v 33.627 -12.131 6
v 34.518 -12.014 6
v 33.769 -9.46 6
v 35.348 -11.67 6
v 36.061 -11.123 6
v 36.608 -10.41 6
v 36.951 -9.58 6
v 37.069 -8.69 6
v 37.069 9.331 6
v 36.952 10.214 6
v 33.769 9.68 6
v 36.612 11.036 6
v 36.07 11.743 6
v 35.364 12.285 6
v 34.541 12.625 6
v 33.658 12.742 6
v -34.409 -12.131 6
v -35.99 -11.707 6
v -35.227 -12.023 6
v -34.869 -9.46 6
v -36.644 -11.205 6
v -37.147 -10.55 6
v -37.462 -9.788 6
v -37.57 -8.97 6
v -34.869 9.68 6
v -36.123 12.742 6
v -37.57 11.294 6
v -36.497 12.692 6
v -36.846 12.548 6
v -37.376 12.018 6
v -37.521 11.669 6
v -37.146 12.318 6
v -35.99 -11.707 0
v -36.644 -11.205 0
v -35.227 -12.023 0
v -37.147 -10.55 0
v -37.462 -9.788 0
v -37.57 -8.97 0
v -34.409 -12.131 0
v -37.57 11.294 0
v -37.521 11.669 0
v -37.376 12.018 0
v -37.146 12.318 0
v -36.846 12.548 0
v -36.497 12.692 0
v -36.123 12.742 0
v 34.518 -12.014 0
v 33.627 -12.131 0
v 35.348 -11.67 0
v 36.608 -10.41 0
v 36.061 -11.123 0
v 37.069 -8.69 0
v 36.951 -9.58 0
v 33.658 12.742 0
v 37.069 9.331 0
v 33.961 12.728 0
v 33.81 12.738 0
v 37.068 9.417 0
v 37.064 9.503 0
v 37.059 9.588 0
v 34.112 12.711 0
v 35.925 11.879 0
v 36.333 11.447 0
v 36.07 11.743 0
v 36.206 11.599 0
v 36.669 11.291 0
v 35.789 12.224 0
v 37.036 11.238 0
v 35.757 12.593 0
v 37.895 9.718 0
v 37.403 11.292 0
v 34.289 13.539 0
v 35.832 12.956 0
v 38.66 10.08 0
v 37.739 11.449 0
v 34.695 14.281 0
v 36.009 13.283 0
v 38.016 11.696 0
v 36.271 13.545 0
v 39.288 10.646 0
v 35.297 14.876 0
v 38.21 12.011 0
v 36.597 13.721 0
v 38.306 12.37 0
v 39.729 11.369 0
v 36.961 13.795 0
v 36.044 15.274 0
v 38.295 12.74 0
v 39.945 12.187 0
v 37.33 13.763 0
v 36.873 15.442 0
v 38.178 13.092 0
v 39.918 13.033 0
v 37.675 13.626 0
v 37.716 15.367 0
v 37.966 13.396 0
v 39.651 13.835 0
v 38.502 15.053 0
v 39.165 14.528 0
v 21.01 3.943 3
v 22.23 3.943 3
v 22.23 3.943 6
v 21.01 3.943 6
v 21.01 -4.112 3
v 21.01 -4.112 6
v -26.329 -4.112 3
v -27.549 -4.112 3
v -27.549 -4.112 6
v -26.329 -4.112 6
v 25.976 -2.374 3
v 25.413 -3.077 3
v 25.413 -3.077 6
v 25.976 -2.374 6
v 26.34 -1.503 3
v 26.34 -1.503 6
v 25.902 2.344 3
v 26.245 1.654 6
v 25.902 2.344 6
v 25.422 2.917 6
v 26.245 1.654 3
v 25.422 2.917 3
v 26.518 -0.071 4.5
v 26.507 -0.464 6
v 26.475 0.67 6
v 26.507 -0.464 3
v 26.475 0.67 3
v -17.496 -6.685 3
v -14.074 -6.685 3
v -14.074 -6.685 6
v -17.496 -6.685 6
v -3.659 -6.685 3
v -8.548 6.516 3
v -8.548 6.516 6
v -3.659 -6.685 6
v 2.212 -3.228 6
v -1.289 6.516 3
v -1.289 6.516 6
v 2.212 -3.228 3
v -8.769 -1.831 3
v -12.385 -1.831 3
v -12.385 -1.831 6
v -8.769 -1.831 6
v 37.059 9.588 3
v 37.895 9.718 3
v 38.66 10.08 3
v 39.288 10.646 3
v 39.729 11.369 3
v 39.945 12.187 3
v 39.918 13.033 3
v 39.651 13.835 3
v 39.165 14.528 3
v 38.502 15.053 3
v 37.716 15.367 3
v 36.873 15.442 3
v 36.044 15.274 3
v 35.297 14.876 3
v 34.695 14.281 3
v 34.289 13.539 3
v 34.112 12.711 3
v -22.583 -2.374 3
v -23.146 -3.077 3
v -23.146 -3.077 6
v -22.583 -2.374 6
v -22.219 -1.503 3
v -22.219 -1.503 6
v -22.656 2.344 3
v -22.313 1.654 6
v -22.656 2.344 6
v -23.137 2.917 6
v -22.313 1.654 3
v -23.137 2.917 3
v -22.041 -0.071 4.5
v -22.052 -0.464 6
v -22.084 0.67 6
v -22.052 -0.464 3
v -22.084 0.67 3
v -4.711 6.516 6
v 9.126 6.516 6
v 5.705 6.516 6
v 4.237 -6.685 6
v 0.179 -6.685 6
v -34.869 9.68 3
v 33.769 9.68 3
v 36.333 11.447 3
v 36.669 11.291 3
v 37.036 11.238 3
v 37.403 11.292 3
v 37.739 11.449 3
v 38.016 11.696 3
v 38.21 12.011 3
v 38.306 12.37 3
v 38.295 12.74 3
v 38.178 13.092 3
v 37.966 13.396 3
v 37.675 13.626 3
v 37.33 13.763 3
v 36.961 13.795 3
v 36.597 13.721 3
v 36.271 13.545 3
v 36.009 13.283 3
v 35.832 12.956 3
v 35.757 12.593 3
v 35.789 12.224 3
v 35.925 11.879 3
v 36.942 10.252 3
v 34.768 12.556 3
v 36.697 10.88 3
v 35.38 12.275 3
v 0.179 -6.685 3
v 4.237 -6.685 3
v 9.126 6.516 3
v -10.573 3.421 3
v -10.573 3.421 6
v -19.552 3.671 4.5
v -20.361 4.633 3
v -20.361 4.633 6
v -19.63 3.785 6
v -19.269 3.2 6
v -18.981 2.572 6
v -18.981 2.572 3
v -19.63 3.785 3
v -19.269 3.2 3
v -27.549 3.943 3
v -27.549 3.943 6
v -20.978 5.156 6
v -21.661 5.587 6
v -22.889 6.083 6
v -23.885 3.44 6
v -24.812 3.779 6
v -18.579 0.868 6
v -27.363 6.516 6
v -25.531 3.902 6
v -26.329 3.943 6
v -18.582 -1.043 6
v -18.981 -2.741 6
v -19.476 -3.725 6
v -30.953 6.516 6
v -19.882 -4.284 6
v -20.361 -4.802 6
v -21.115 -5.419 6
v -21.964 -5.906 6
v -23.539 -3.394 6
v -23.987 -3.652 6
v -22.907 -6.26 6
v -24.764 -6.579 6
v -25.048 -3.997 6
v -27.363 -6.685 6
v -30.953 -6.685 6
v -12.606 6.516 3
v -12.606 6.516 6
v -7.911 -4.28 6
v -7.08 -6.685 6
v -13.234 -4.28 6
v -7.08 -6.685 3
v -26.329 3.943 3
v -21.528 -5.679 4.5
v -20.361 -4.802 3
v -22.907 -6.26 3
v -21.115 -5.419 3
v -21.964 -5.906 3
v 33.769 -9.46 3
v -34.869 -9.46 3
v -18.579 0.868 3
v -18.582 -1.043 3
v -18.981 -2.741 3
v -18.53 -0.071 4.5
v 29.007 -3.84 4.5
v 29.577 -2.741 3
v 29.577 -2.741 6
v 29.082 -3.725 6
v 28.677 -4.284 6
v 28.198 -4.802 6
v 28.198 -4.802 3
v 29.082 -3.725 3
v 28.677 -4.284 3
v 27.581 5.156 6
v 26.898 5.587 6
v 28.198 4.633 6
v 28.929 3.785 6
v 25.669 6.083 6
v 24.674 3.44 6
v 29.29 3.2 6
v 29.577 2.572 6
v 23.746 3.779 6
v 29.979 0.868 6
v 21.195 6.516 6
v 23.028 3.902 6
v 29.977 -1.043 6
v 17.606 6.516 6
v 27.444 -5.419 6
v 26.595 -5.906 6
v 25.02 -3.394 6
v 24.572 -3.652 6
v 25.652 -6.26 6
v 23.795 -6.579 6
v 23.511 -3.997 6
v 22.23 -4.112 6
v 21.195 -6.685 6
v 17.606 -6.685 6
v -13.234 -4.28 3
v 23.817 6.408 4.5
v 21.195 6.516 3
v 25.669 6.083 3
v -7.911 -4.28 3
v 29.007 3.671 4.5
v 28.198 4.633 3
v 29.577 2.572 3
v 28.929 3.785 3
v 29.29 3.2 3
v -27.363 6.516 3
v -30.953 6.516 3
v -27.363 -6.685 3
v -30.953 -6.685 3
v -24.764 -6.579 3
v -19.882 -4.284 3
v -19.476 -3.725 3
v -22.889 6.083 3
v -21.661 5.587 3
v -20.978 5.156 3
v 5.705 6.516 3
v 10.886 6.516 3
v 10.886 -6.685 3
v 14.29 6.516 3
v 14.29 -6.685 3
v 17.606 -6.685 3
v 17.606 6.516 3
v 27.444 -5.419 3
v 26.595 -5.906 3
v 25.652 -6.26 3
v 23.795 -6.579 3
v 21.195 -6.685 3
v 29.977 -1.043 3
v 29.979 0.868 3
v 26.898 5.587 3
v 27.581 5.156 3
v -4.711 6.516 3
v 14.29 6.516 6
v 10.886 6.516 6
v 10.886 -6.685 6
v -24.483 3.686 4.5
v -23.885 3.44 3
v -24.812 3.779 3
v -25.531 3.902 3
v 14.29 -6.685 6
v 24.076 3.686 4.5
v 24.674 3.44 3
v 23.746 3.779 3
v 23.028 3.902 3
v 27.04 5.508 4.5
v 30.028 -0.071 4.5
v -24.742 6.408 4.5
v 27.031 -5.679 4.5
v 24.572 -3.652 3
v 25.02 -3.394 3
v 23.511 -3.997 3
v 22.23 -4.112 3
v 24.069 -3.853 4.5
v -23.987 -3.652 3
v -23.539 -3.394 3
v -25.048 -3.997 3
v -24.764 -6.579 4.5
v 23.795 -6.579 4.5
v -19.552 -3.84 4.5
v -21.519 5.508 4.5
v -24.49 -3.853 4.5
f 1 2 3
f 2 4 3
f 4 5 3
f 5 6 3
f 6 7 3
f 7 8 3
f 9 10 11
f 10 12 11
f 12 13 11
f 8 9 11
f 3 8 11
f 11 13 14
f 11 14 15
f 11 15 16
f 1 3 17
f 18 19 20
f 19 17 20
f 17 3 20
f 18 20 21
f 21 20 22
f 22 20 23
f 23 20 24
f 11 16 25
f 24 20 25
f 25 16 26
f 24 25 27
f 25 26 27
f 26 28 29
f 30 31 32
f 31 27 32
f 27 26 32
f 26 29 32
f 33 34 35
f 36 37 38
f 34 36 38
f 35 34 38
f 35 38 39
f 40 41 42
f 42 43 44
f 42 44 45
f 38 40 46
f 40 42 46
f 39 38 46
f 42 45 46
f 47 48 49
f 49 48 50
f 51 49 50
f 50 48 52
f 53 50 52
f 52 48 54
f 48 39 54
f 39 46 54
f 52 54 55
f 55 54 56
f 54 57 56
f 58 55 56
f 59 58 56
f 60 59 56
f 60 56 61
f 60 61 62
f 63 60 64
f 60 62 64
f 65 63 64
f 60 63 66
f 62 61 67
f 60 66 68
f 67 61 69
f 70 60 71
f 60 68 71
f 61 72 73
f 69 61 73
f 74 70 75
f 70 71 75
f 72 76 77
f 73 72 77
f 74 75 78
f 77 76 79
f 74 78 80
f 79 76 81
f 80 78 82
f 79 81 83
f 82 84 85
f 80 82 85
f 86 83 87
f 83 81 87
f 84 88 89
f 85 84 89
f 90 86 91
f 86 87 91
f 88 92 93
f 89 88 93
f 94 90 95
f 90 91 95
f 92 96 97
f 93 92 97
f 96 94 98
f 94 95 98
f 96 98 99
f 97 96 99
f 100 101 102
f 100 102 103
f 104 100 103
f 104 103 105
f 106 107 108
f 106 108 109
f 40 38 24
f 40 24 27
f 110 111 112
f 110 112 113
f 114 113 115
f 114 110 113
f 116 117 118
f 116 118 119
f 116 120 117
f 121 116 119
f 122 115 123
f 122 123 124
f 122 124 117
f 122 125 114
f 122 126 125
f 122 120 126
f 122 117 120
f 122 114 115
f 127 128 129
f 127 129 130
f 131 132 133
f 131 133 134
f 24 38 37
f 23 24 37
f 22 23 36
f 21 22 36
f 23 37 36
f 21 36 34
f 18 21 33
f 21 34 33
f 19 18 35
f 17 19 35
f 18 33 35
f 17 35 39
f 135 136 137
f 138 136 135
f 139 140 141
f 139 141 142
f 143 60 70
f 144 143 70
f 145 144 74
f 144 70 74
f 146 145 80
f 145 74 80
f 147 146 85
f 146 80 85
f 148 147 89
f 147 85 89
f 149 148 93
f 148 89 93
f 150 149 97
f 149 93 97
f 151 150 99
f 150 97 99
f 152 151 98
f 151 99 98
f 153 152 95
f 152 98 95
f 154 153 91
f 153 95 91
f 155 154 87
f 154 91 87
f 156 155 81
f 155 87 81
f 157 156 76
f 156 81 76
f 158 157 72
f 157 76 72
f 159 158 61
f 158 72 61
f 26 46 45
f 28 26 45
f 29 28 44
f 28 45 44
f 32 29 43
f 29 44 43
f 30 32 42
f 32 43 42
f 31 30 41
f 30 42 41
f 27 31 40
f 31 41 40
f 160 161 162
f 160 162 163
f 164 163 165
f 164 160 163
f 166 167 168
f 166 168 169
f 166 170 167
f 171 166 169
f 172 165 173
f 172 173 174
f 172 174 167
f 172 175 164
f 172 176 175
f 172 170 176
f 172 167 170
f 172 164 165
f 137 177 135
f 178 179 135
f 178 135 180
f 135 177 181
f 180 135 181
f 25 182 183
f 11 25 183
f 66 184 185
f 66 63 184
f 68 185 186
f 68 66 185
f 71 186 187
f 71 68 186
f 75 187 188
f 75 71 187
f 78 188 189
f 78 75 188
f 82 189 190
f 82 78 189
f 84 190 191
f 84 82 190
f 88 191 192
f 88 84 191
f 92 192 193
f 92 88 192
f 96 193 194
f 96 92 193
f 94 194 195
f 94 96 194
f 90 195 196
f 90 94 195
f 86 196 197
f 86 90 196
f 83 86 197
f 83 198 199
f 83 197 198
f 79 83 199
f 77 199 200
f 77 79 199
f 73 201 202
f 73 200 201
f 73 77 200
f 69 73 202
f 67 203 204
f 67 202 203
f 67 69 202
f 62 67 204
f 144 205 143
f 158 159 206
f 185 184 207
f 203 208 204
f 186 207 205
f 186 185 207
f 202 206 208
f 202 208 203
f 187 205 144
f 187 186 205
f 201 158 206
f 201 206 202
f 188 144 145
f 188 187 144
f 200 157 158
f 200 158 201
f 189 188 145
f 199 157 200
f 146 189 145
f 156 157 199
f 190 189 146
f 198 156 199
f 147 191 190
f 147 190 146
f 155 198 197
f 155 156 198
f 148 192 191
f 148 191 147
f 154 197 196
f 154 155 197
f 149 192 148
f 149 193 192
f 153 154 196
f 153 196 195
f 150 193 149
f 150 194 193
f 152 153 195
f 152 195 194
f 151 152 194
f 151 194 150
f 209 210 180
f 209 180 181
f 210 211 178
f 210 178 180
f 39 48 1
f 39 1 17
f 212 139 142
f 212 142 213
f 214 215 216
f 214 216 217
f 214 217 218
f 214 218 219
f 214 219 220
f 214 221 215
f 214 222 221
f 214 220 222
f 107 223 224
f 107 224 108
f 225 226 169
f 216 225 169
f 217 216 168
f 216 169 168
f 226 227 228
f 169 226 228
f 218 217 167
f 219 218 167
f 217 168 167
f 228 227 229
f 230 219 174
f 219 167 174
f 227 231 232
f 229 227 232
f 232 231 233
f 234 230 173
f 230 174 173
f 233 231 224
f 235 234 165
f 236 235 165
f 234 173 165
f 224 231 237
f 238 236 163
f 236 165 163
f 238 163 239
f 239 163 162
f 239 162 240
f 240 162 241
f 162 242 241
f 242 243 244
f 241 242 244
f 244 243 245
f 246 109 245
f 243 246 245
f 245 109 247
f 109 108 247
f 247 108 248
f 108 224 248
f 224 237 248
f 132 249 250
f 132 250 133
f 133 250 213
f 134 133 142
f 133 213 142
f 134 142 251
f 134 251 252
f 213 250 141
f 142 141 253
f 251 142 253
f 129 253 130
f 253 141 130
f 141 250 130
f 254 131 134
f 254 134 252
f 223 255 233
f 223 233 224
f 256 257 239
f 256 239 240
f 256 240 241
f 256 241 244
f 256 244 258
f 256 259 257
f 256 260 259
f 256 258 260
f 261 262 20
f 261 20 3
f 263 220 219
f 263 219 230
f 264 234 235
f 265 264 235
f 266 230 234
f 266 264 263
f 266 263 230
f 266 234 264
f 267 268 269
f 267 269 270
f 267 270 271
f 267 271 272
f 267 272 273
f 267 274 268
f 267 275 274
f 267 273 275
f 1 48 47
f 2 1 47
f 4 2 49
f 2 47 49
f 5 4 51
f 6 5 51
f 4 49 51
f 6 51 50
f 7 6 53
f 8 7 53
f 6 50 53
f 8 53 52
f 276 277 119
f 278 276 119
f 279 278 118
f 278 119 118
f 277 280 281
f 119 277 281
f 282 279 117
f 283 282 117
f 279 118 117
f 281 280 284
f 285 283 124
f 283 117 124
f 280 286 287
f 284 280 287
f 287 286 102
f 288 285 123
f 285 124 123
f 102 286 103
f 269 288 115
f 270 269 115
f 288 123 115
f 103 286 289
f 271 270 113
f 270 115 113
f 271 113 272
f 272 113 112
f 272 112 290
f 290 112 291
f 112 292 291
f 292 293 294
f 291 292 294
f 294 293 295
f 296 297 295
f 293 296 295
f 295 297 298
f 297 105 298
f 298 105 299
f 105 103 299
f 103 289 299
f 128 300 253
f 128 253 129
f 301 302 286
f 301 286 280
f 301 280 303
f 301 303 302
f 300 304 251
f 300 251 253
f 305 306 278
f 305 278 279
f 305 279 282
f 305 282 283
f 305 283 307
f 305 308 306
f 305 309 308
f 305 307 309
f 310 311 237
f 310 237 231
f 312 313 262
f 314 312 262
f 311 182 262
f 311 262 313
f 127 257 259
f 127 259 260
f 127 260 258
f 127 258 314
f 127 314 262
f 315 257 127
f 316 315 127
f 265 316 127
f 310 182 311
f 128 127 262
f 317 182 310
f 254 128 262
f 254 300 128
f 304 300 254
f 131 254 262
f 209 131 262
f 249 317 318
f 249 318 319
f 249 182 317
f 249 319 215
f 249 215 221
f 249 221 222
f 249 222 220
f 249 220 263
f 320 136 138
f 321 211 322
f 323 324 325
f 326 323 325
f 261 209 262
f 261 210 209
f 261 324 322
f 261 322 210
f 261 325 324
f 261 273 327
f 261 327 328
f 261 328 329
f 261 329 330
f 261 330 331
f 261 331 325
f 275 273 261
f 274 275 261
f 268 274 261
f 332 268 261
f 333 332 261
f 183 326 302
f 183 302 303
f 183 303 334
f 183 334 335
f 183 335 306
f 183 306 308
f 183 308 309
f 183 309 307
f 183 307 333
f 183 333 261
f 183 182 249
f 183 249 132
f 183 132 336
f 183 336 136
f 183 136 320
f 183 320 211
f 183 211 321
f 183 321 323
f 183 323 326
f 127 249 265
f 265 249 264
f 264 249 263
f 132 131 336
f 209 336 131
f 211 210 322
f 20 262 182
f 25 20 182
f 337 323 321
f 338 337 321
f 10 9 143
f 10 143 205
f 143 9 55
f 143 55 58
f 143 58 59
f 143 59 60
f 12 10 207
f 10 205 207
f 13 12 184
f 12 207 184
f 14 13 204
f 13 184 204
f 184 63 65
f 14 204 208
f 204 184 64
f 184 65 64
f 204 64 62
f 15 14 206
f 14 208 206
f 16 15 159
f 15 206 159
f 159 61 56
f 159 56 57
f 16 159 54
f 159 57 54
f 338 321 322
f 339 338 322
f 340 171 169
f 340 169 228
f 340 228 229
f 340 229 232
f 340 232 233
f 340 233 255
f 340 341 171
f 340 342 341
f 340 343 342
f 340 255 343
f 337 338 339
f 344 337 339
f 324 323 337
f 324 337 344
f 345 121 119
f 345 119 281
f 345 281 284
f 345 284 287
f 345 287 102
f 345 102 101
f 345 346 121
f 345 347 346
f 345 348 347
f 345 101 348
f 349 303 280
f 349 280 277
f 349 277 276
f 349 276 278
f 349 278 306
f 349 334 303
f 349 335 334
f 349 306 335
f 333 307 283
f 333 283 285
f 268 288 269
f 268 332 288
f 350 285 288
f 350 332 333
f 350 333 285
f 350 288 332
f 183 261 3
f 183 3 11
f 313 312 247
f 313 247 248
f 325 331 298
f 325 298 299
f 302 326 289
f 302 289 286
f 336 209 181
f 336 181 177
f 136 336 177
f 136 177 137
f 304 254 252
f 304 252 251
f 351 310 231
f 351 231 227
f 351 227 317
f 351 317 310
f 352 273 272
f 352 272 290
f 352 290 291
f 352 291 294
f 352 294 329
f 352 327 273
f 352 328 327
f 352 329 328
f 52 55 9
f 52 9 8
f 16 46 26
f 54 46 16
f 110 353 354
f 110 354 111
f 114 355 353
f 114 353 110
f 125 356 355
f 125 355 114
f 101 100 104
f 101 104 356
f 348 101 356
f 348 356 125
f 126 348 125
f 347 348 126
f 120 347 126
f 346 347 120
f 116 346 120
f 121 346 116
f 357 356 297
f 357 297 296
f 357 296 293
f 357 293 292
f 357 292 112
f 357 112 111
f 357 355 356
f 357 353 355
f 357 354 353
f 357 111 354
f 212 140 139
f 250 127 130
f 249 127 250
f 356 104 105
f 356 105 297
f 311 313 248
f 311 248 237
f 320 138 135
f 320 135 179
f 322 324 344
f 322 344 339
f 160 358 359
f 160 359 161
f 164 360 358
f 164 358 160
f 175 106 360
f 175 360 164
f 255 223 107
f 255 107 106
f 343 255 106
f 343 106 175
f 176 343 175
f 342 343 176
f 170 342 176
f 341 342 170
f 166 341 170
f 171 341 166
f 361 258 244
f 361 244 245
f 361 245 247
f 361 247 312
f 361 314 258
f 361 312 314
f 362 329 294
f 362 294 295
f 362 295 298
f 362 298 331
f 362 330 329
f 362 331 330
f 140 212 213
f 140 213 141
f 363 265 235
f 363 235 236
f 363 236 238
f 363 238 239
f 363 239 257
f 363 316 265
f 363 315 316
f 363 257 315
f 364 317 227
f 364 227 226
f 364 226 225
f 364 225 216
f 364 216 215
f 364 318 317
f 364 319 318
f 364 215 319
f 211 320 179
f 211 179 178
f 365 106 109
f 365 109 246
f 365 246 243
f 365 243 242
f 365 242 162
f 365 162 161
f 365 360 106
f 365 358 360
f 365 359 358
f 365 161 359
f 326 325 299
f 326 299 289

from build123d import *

# Parameters (mm, degrees)
SKETCH002_R      = 2.929284
SKETCH002_R_2    = 1.279954
PAD002_DEPTH     = 3
PATH4830_W       = 13.200666
PATH4830_H       = 3.404056
EXTRUDE005_DEPTH = 3
EXTRUDE006_DEPTH = 3
EXTRUDE007_DEPTH = 3
EXTRUDE003_DEPTH = 3
EXTRUDE002_DEPTH = 3
EXTRUDE_DEPTH    = 3
EXTRUDE001_DEPTH = 3
EXTRUDE004_DEPTH = 3
SKETCH_W         = 68.637524
SKETCH_H         = 19.139309
PAD_DEPTH        = 3
PAD001_DEPTH     = 6


with BuildPart() as enganche:
    # Sketch002 → Pad002 (new body)
    with BuildSketch(Plane.XY):
        with Locations((37.034641, 12.51759)):
            Circle(SKETCH002_R)
        with Locations((37.034641, 12.51759)):
            Circle(SKETCH002_R_2, mode=Mode.SUBTRACT)
    extrude(amount=PAD002_DEPTH)


with BuildPart() as extrude005:
    # path4830 → Extrude005 (new body)
    with BuildSketch(Plane(origin=(12.588005, -0.084494, 0), x_dir=(0, -1, 0), z_dir=(0, 0, -1))):
        Rectangle(PATH4830_W, PATH4830_H)
    extrude(amount=-EXTRUDE005_DEPTH)


with BuildPart() as d2_corte:
    # path4832 → Extrude006 (new body)
    with BuildSketch(Plane(origin=(23.76392, -0.084496, 0), x_dir=(0, 1, 0), z_dir=(0, 0, 1))):
        with BuildLine():
            Line((4.027397, 2.754193), (-4.027397, 2.754193))
            Line((-4.027397, 2.754193), (-4.027397, 1.534037))
            add(Edge.make_bspline(
                [(-4.027397, 1.534037), (-4.027397, -0.552604), (-2.992918, -1.64898)],
                knots=[0, 0, 0, 1, 1, 1], degree=2))
            add(Edge.make_bspline(
                [(-2.992918, -1.64898), (-1.958435, -2.754193), (0.013263, -2.754193)],
                knots=[0, 0, 0, 1, 1, 1], degree=2))
            add(Edge.make_bspline(
                [(0.013263, -2.754193), (1.976123, -2.754193), (3.00176, -1.657821)],
                knots=[0, 0, 0, 1, 1, 1], degree=2))
            add(Edge.make_bspline(
                [(3.00176, -1.657821), (4.027397, -0.561446), (4.027397, 1.534037)],
                knots=[0, 0, 0, 1, 1, 1], degree=2))
            Line((4.027397, 1.534037), (4.027397, 2.754193))
        make_face()
    extrude(amount=EXTRUDE006_DEPTH)


with BuildPart() as d2:
    # path4832001 → Extrude007 (new body)
    with BuildSketch(Plane(origin=(23.816969, -0.084494, 0), x_dir=(0, -1, 0), z_dir=(0, 0, -1))):
        with BuildLine():
            Line((-6.600333, 6.211297), (-6.600333, 2.621564))
            add(Edge.make_bspline(
                [(-6.600333, 2.621564), (-6.600333, -0.384617), (-6.167086, -1.852338)],
                knots=[0, 0, 0, 1, 1, 1], degree=2))
            add(Edge.make_bspline(
                [(-6.167086, -1.852338), (-5.742686, -3.328901), (-4.717049, -4.381068)],
                knots=[0, 0, 0, 1, 1, 1], degree=2))
            add(Edge.make_bspline(
                [(-4.717049, -4.381068), (-3.824034, -5.309445), (-2.656929, -5.760371)],
                knots=[0, 0, 0, 1, 1, 1], degree=2))
            add(Edge.make_bspline(
                [(-2.656929, -5.760371), (-1.489823, -6.211297), (-0.013261, -6.211297)],
                knots=[0, 0, 0, 1, 1, 1], degree=2))
            add(Edge.make_bspline(
                [(-0.013261, -6.211297), (1.480986, -6.211297), (2.656933, -5.760371)],
                knots=[0, 0, 0, 1, 1, 1], degree=2))
            add(Edge.make_bspline(
                [(2.656933, -5.760371), (3.824038, -5.309445), (4.717053, -4.381068)],
                knots=[0, 0, 0, 1, 1, 1], degree=2))
            add(Edge.make_bspline(
                [(4.717053, -4.381068), (5.74269, -3.320059), (6.175932, -1.834655)],
                knots=[0, 0, 0, 1, 1, 1], degree=2))
            add(Edge.make_bspline(
                [(6.175932, -1.834655), (6.600333, -0.34925), (6.600333, 2.621564)],
                knots=[0, 0, 0, 1, 1, 1], degree=2))
            Line((6.600333, 2.621564), (6.600333, 6.211297))
            Line((6.600333, 6.211297), (-6.600333, 6.211297))
        make_face()
    extrude(amount=-EXTRUDE007_DEPTH)

    # Cut001: cut D2-Corte
    add(d2_corte.part, mode=Mode.SUBTRACT)


with BuildPart() as a_corte:
    # path4826001 → Extrude003 (new body)
    with BuildSketch(Plane(origin=(-10.577261, 0.795254, 0), x_dir=(0, 1, 0), z_dir=(0, 0, 1))):
        Polygon((-2.625987, 1.808129), (-2.625987, -1.808129), (2.625987, -0.004421), align=None)
    extrude(amount=EXTRUDE003_DEPTH)


with BuildPart() as a:
    # path4826 → Extrude002 (new body)
    with BuildSketch(Plane(origin=(-10.577261, -0.084494, 0), x_dir=(0, -1, 0), z_dir=(0, 0, -1))):
        Polygon((4.195393, -2.665773), (4.195393, 2.656935), (6.600333, 3.496895), (6.600333, 6.918635), (-6.600333, 2.029174), (-6.600333, -2.029169), (6.600333, -6.918635), (6.600333, -3.496895), align=None)
    extrude(amount=-EXTRUDE002_DEPTH)

    # Cut: cut A-Corte
    add(a_corte.part, mode=Mode.SUBTRACT)


with BuildPart() as d1_corte:
    # path4824 → Extrude (new body)
    with BuildSketch(Plane(origin=(-24.794724, -0.084496, 0), x_dir=(0, 1, 0), z_dir=(0, 0, 1))):
        with BuildLine():
            Line((4.027397, 2.754193), (-4.027397, 2.754193))
            Line((-4.027397, 2.754193), (-4.027397, 1.534037))
            add(Edge.make_bspline(
                [(-4.027397, 1.534037), (-4.027397, -0.552609), (-2.992918, -1.64898)],
                knots=[0, 0, 0, 1, 1, 1], degree=2))
            add(Edge.make_bspline(
                [(-2.992918, -1.64898), (-1.958435, -2.754193), (0.013263, -2.754193)],
                knots=[0, 0, 0, 1, 1, 1], degree=2))
            add(Edge.make_bspline(
                [(0.013263, -2.754193), (1.976123, -2.754193), (3.00176, -1.657821)],
                knots=[0, 0, 0, 1, 1, 1], degree=2))
            add(Edge.make_bspline(
                [(3.00176, -1.657821), (4.027397, -0.56145), (4.027397, 1.534037)],
                knots=[0, 0, 0, 1, 1, 1], degree=2))
            Line((4.027397, 1.534037), (4.027397, 2.754193))
        make_face()
    extrude(amount=EXTRUDE_DEPTH)


with BuildPart() as d1:
    # path4824001 → Extrude001 (new body)
    with BuildSketch(Plane(origin=(-24.741674, -0.084494, 0), x_dir=(0, -1, 0), z_dir=(0, 0, -1))):
        with BuildLine():
            Line((-6.600333, 6.211299), (-6.600333, 2.621566))
            add(Edge.make_bspline(
                [(-6.600333, 2.621566), (-6.600333, -0.384615), (-6.167086, -1.852336)],
                knots=[0, 0, 0, 1, 1, 1], degree=2))
            add(Edge.make_bspline(
                [(-6.167086, -1.852336), (-5.742686, -3.328903), (-4.717049, -4.381066)],
                knots=[0, 0, 0, 1, 1, 1], degree=2))
            add(Edge.make_bspline(
                [(-4.717049, -4.381066), (-3.824034, -5.309443), (-2.656929, -5.760369)],
                knots=[0, 0, 0, 1, 1, 1], degree=2))
            add(Edge.make_bspline(
                [(-2.656929, -5.760369), (-1.489823, -6.211299), (-0.013261, -6.211299)],
                knots=[0, 0, 0, 1, 1, 1], degree=2))
            add(Edge.make_bspline(
                [(-0.013261, -6.211299), (1.480986, -6.211299), (2.656933, -5.760369)],
                knots=[0, 0, 0, 1, 1, 1], degree=2))
            add(Edge.make_bspline(
                [(2.656933, -5.760369), (3.824038, -5.309443), (4.717053, -4.381066)],
                knots=[0, 0, 0, 1, 1, 1], degree=2))
            add(Edge.make_bspline(
                [(4.717053, -4.381066), (5.74269, -3.320062), (6.175932, -1.834653)],
                knots=[0, 0, 0, 1, 1, 1], degree=2))
            add(Edge.make_bspline(
                [(6.175932, -1.834653), (6.600333, -0.349248), (6.600333, 2.621566)],
                knots=[0, 0, 0, 1, 1, 1], degree=2))
            Line((6.600333, 2.621566), (6.600333, 6.211299))
            Line((6.600333, 6.211299), (-6.600333, 6.211299))
        make_face()
    extrude(amount=-EXTRUDE001_DEPTH)

    # Cut002: cut D1-Corte
    add(d1_corte.part, mode=Mode.SUBTRACT)


with BuildPart() as letras:
    # path4828 → Extrude004 (new body)
    with BuildSketch(Plane(origin=(2.207842, -0.084494, 0), x_dir=(0, -1, 0), z_dir=(0, 0, -1))):
        Polygon((-6.600333, 6.918635), (-6.600333, 3.496895), (3.143226, -0.004421), (-6.600333, -3.496895), (-6.600333, -6.918635), (6.600333, -2.029169), (6.600333, 2.029169), align=None)
    extrude(amount=-EXTRUDE004_DEPTH)

    # Fusion: union Extrude005, D2, A, D1
    add(extrude005.part)
    add(d2.part)
    add(a.part)
    add(d1.part)


with BuildPart() as letras_1:
    # Fusion placement: moved
    add(letras.part.moved(Location((0, 0, 3))))


with BuildPart() as corte_base:
    # Sketch → Pad (new body)
    with BuildSketch(Plane.XY.offset(3)):
        with Locations((-0.549982, 0.109995)):
            Rectangle(SKETCH_W, SKETCH_H)
    extrude(amount=PAD_DEPTH)


with BuildPart() as llavero_david:
    # Sketch001 → Pad001 (new body)
    with BuildSketch(Plane.XY):
        with BuildLine():
            Line((-36.122698, 12.741634), (33.658366, 12.741634))
            ThreePointArc((37.068661, 9.33134), (36.069809, 11.742782), (33.658366, 12.741634))
            Line((37.068661, 9.33134), (37.068661, -8.689686))
            ThreePointArc((33.627401, -12.130946), (36.060739, -11.123024), (37.068661, -8.689686))
            Line((33.627401, -12.130946), (-34.409048, -12.130946))
            ThreePointArc((-37.57005, -8.969945), (-36.644214, -11.20511), (-34.409048, -12.130946))
            Line((-37.57005, -8.969945), (-37.57005, 11.294283))
            ThreePointArc((-36.122698, 12.741634), (-37.14613, 12.317715), (-37.57005, 11.294283))
        make_face()
    extrude(amount=PAD001_DEPTH)

    # Cut003: cut Corte-Base
    add(corte_base.part, mode=Mode.SUBTRACT)

    # Fusion001: union Letras
    add(letras_1.part)

    # Fusion002: union Enganche
    add(enganche.part)


solid = llavero_david.part
